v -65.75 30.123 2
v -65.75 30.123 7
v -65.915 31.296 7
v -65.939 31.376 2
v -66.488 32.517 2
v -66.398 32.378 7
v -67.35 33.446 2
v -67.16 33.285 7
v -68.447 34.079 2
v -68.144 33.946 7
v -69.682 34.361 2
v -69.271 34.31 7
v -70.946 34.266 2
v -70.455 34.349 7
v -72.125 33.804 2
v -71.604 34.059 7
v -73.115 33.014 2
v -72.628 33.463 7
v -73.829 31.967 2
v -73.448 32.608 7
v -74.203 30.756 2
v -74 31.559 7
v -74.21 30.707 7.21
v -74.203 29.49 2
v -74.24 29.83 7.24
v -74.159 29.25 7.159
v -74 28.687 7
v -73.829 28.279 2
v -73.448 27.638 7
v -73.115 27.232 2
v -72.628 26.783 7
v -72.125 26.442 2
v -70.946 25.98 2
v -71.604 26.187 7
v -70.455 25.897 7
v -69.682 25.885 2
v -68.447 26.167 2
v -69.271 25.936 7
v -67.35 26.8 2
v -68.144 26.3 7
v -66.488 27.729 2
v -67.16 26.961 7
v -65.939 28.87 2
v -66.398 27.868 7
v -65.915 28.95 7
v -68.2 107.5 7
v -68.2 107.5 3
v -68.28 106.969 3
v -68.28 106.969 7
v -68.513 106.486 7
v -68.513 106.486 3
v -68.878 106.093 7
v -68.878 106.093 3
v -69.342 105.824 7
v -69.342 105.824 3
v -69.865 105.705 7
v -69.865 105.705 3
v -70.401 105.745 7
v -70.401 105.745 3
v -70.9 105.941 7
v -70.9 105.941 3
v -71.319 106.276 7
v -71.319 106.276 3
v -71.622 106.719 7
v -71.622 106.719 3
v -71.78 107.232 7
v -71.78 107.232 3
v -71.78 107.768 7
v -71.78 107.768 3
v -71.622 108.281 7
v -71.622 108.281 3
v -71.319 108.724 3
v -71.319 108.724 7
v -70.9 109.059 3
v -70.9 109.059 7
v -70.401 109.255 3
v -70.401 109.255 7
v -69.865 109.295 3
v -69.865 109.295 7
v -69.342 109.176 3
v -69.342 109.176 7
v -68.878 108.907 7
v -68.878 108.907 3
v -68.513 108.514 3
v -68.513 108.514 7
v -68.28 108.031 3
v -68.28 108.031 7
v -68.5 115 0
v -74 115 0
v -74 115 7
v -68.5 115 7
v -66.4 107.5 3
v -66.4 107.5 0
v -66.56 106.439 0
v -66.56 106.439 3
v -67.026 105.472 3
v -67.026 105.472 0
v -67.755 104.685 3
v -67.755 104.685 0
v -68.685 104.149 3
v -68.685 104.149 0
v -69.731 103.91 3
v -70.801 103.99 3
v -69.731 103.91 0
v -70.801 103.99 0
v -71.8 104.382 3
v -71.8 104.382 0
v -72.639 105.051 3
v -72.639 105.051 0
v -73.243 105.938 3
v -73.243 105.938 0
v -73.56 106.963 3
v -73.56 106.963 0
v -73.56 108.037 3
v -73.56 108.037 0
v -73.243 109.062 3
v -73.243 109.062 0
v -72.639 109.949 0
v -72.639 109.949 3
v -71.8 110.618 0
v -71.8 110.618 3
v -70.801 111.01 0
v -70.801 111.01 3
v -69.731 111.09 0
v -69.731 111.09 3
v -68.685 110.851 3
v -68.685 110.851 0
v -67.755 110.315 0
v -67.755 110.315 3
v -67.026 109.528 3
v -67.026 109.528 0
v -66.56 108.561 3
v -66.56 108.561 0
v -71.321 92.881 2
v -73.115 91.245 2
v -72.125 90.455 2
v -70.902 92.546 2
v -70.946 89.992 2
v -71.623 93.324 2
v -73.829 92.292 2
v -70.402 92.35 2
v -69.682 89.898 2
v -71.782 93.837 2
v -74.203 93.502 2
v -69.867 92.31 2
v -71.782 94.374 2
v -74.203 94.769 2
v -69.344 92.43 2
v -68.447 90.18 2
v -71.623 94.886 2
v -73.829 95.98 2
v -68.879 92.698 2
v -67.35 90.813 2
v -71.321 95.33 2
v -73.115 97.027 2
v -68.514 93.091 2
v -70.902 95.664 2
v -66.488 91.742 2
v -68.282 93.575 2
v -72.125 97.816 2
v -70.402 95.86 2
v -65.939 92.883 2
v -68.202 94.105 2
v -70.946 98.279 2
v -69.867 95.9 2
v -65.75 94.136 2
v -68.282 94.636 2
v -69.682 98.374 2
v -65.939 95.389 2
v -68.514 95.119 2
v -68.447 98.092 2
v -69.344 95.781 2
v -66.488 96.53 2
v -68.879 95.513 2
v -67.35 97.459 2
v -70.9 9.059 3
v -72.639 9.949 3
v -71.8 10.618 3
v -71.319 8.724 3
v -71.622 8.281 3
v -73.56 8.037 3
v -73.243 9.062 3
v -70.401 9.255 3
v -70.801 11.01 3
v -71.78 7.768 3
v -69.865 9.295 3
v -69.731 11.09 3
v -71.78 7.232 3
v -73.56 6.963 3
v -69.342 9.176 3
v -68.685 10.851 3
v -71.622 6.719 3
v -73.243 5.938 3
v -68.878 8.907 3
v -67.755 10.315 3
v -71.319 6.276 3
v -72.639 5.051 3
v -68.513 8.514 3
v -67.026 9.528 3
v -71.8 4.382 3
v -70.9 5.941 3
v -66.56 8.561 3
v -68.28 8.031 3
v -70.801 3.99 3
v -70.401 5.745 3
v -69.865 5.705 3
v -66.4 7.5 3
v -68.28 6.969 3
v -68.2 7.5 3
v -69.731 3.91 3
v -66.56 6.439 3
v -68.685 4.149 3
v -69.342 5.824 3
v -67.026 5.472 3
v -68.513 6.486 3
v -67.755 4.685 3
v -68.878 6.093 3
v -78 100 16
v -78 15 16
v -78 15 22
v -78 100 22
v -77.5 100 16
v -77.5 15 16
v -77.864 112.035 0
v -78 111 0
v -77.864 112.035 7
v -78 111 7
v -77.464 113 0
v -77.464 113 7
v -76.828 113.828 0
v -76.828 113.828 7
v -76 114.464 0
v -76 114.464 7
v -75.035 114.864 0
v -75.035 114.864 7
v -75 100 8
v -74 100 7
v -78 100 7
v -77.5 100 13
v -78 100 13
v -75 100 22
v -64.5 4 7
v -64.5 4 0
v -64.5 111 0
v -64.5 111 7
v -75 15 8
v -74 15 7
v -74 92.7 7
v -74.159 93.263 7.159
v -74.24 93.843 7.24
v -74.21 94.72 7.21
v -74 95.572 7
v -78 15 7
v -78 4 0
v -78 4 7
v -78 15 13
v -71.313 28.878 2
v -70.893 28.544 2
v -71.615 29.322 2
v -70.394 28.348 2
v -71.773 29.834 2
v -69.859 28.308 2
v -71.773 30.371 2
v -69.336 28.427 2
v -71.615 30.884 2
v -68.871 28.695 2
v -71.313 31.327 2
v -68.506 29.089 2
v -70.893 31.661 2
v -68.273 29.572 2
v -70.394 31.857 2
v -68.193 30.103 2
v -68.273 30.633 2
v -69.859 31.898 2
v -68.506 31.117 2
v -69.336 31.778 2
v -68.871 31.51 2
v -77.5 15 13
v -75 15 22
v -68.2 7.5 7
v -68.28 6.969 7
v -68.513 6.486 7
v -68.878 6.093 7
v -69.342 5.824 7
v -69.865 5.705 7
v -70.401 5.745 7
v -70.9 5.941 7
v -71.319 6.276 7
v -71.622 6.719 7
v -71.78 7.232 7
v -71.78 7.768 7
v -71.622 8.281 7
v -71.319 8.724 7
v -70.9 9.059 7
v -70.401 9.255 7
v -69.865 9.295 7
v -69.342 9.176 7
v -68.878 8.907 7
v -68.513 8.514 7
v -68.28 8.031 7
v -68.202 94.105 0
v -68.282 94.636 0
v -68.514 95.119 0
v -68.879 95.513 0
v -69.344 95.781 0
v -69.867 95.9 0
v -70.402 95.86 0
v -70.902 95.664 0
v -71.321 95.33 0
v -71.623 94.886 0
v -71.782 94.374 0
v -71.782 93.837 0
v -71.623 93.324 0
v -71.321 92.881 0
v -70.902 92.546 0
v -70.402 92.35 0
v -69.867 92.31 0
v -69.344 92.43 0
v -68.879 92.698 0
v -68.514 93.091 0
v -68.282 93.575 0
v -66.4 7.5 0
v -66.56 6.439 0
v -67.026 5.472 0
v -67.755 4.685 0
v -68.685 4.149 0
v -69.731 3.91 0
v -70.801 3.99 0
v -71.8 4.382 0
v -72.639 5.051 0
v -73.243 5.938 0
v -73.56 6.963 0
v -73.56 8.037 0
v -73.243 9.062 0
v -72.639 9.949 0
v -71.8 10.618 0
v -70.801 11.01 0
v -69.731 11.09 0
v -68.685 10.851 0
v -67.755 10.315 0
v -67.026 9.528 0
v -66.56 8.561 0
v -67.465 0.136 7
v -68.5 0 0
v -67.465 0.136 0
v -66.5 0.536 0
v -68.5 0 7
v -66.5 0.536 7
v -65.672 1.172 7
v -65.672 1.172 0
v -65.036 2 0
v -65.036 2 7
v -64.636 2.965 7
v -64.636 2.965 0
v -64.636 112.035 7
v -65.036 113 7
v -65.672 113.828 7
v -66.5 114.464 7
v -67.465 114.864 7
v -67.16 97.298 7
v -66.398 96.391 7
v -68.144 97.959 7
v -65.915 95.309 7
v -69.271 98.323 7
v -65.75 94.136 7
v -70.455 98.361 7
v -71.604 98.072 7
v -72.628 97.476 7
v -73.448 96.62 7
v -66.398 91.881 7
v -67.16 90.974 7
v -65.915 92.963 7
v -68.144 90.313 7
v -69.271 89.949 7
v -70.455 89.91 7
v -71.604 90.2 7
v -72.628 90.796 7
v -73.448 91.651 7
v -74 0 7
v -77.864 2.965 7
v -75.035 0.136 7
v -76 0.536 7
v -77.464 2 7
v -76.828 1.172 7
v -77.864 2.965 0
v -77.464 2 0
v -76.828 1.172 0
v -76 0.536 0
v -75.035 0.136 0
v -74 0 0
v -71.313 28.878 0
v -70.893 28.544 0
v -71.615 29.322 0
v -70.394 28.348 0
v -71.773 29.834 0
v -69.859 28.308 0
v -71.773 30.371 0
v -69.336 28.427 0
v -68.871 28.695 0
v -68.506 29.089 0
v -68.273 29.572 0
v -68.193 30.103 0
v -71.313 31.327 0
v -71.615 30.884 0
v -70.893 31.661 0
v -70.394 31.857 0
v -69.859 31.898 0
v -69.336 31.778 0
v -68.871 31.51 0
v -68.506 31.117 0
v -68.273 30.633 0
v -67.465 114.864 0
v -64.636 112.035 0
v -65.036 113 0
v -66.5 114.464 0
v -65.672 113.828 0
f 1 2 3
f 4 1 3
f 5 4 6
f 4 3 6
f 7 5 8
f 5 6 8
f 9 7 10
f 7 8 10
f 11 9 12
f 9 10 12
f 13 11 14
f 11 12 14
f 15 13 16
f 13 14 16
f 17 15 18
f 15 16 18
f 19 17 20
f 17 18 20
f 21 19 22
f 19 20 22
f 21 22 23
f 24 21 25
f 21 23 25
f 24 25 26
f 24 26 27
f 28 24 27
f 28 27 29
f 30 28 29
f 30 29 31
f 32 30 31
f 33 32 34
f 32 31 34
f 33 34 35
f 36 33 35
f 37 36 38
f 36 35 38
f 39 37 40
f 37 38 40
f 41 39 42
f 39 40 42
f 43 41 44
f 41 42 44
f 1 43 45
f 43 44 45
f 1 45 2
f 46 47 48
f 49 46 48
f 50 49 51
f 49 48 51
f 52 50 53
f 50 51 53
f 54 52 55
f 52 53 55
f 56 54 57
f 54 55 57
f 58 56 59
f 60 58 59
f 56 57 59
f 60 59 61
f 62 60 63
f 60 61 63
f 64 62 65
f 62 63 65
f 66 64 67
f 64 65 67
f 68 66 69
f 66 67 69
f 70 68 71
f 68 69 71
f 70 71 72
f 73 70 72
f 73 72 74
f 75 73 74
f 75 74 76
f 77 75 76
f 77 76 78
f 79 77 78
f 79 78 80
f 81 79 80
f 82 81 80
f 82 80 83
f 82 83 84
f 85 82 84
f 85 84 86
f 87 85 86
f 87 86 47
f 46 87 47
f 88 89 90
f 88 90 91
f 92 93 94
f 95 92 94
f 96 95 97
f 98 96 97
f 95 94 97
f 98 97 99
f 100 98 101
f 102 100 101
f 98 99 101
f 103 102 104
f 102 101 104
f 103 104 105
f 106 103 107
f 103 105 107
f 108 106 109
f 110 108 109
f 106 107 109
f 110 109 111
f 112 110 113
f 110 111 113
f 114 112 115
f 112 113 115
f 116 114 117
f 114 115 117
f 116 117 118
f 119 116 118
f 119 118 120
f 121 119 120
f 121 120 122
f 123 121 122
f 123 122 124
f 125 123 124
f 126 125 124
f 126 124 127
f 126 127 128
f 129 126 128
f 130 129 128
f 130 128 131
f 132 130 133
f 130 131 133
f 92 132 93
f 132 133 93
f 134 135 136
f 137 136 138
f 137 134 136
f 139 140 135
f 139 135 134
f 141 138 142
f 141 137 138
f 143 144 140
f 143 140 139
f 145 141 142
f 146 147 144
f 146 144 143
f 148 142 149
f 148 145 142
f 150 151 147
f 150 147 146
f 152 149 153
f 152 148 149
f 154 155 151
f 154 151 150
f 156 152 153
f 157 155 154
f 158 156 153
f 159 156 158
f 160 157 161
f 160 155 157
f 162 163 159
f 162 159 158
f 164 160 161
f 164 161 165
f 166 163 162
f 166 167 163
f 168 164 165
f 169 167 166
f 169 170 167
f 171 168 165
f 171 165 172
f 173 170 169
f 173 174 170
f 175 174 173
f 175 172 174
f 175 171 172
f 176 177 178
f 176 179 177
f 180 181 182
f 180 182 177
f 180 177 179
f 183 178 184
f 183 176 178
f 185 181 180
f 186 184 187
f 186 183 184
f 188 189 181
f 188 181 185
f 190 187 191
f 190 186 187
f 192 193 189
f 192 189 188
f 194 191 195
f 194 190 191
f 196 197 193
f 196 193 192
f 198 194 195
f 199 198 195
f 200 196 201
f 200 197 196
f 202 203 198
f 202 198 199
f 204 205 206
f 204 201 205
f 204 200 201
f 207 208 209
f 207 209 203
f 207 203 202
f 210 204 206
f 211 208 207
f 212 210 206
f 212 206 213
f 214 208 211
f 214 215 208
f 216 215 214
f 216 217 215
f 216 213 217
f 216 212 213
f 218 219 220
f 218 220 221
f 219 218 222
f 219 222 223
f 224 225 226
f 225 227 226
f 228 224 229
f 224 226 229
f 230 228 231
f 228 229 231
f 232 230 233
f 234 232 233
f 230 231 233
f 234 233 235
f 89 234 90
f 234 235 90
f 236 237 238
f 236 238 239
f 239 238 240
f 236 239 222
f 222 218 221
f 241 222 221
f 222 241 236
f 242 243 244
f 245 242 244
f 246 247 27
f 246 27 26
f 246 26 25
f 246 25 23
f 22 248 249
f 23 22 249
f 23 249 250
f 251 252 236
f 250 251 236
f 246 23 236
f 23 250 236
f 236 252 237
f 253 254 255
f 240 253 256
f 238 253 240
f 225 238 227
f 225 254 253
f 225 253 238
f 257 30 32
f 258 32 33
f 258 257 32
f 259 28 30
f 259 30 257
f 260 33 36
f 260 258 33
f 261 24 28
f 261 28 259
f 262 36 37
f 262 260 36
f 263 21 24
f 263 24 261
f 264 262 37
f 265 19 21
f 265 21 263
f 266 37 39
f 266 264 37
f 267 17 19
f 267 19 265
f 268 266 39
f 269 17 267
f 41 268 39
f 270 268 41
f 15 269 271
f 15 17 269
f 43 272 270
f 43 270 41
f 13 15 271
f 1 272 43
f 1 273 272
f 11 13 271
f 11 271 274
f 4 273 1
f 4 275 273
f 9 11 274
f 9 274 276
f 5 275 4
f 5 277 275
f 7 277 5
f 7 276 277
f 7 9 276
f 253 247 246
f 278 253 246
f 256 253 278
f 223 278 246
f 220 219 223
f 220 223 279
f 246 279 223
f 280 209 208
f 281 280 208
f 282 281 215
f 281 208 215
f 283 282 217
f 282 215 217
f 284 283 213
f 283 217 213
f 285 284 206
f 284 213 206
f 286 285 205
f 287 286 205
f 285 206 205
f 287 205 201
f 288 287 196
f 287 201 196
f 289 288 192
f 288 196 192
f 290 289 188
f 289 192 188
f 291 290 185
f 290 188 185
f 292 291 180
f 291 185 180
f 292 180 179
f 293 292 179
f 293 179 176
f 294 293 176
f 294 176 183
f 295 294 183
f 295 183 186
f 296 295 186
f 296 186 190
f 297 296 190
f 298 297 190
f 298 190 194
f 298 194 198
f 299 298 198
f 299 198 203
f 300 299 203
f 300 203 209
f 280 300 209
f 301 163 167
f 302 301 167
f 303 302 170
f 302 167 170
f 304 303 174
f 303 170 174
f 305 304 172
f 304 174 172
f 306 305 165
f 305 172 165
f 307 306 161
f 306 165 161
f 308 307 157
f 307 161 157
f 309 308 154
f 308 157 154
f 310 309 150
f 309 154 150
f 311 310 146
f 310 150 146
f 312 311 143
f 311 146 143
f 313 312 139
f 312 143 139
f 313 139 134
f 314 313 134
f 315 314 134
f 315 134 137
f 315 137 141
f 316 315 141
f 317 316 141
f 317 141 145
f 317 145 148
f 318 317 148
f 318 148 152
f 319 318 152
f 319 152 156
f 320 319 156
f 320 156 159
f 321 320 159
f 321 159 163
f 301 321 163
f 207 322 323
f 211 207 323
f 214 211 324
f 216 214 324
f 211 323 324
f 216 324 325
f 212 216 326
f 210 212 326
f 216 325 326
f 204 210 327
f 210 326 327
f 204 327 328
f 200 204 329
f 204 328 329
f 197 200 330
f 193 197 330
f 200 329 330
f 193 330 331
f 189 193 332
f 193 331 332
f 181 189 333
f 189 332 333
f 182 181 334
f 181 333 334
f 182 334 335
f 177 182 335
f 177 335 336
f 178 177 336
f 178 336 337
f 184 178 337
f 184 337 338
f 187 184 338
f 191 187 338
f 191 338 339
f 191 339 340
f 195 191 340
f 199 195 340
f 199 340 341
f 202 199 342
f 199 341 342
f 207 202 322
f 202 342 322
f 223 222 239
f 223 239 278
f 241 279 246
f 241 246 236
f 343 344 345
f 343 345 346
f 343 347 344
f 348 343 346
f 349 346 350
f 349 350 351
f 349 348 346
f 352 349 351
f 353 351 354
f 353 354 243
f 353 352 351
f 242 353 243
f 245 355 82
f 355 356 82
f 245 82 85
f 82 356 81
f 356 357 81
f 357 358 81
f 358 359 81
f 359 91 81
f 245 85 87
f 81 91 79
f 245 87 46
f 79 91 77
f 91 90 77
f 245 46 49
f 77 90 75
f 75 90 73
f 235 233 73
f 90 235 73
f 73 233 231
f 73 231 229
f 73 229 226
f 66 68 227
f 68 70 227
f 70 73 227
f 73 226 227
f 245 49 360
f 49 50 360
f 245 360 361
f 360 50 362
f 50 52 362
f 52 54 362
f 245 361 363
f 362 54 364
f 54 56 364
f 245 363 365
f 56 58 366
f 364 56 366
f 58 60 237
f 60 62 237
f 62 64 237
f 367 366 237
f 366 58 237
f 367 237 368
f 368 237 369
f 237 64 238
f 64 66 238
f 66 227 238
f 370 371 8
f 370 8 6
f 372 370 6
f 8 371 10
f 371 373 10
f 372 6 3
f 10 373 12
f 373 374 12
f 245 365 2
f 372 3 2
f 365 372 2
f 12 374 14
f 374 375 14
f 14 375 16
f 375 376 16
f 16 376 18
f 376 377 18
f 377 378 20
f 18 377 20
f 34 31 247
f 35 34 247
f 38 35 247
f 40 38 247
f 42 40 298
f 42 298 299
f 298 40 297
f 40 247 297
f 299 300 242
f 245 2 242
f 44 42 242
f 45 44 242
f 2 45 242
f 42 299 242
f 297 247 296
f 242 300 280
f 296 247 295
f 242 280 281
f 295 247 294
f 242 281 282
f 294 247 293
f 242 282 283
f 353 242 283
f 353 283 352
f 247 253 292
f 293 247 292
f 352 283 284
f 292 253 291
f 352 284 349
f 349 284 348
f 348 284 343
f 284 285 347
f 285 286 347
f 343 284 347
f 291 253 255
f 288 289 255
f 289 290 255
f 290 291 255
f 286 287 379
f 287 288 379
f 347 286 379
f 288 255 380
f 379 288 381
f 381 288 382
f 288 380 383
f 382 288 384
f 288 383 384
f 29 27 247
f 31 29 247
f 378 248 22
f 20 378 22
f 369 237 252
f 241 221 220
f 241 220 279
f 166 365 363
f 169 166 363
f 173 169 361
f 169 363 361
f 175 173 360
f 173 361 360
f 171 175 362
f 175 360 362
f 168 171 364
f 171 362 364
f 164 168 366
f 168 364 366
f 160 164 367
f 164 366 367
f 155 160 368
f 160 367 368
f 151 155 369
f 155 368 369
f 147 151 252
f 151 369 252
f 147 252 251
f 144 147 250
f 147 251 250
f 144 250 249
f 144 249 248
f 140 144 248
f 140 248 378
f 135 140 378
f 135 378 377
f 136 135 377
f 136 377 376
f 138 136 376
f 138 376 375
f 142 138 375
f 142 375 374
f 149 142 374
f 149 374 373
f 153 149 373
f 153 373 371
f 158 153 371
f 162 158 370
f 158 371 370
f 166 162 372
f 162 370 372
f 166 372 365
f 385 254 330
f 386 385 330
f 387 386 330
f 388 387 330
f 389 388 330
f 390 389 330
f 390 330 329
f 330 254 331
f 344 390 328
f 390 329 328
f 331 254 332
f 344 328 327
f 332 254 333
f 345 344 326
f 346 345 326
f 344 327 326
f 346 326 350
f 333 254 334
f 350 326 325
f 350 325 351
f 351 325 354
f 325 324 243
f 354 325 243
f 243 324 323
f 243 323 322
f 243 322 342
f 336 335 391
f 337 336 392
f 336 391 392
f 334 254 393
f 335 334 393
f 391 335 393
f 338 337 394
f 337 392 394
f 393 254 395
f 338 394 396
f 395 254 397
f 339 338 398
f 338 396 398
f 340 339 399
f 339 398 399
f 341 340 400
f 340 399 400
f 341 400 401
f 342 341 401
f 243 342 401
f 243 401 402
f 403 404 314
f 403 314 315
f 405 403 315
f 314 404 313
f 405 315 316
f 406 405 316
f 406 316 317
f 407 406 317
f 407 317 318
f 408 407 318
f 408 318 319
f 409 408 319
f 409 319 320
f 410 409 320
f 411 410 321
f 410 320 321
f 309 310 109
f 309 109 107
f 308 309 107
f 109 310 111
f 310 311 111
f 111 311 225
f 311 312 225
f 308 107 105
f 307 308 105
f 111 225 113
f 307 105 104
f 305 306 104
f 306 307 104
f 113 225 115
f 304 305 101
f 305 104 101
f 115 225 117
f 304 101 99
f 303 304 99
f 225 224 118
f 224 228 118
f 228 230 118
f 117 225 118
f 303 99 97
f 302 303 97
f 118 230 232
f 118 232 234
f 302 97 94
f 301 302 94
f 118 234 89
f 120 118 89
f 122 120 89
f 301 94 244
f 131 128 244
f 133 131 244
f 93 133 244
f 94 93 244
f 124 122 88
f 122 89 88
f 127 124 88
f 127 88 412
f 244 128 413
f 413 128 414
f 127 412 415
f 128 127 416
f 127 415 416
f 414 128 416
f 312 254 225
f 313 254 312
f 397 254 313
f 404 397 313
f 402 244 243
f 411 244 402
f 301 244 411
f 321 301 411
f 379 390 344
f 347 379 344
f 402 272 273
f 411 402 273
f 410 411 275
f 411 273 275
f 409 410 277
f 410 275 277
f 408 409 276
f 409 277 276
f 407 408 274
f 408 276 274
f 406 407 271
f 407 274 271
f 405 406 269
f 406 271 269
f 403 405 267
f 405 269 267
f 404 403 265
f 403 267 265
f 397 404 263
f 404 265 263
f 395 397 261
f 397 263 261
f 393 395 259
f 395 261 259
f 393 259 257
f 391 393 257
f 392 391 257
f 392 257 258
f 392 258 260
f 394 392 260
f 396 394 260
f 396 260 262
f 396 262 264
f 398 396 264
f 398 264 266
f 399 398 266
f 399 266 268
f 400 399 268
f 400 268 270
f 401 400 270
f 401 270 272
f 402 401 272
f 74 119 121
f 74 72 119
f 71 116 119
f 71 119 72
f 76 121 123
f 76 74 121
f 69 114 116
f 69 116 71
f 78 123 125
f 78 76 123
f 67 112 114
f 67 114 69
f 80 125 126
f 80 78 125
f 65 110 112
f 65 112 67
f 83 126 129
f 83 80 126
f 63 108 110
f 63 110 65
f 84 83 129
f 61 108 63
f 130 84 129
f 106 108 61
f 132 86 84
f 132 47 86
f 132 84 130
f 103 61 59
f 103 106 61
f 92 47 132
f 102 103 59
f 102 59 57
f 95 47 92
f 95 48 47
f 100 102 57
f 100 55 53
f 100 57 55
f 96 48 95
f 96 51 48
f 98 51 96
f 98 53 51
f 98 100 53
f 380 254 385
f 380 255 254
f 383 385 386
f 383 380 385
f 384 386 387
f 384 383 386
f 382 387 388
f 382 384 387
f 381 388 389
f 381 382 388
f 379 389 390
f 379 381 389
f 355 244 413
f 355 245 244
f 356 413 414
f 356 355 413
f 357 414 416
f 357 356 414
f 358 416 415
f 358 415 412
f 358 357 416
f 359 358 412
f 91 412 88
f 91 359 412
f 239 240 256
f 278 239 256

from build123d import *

# Parameters (mm, degrees)
SKETCH008_W     = 13.5
SKETCH008_H     = 115
PAD001_DEPTH    = 22
SKETCH009_W     = 16
SKETCH009_H     = 16
POCKET007_DEPTH = 30
SKETCH010_R     = 1.8
POCKET008_DEPTH = 22.001
SKETCH011_R     = 3.6
POCKET009_DEPTH = 18
SKETCH012_W     = 11
SKETCH012_H     = 85
POCKET010_DEPTH = 15
CHAMFER001_SIZE = 1
SKETCH013_W     = 87.5
SKETCH013_H     = 3
POCKET011_DEPTH = 0.5
SKETCH014_R     = 1.8
POCKET012_DEPTH = 22.001
SKETCH015_R     = 3.6
POCKET013_DEPTH = 3
FILLET003_R     = 4
SKETCH016_R     = 4.25
POCKET014_DEPTH = 5
SKETCH017_R     = 1.8
POCKET015_DEPTH = 19.001


with BuildPart() as part:
    # Sketch008 → Pad001 (new body)
    with BuildSketch(Plane.XY):
        with Locations((-71.25, 57.5)):
            Rectangle(SKETCH008_W, SKETCH008_H)
    extrude(amount=PAD001_DEPTH)

    # Sketch009 → Pocket007 (cut)
    with BuildSketch(Plane(origin=(-78, 0, 0), x_dir=(0, -1, 0), z_dir=(-1, 0, 0))):
        with Locations((-108, 15)):
            Rectangle(SKETCH009_W, SKETCH009_H)
        with Locations((-7, 15)):
            Rectangle(SKETCH009_W, SKETCH009_H)
    extrude(amount=-POCKET007_DEPTH, mode=Mode.SUBTRACT)

    # Sketch010 → Pocket008 (cut, through all)
    with BuildSketch(Plane.XY.offset(22)):
        with Locations((-70.00164, 94.105309)):
            Circle(SKETCH010_R)
        with Locations((-69.993416, 30.102623)):
            Circle(SKETCH010_R)
    extrude(amount=-POCKET008_DEPTH, mode=Mode.SUBTRACT)

    # Sketch011 → Pocket009 (cut)
    with BuildSketch(Plane.XY.offset(22)):
        with Locations((-70, 94.117142)):
            Circle(SKETCH011_R)
        with Locations((-70, 30.122299)):
            Circle(SKETCH011_R)
    extrude(amount=-POCKET009_DEPTH, mode=Mode.SUBTRACT)

    # Sketch012 → Pocket010 (cut)
    with BuildSketch(Plane.XY.offset(22)):
        with Locations((-69.5, 57.5)):
            Rectangle(SKETCH012_W, SKETCH012_H)
    extrude(amount=-POCKET010_DEPTH, mode=Mode.SUBTRACT)

    # Chamfer001
    chamfer001_edges = [part.edges().sort_by_distance(p)[0] for p in [
        (-75, 57.5, 7),
    ]]
    chamfer(chamfer001_edges, length=CHAMFER001_SIZE)

    # Sketch013 → Pocket011 (cut)
    with BuildSketch(Plane(origin=(-78, 0, 0), x_dir=(0, -1, 0), z_dir=(-1, 0, 0))):
        with Locations((-57.75, 14.5)):
            Rectangle(SKETCH013_W, SKETCH013_H)
    extrude(amount=-POCKET011_DEPTH, mode=Mode.SUBTRACT)

    # Sketch014 → Pocket012 (cut, through all)
    with BuildSketch(Plane(origin=(0, 0, 0), x_dir=(1, 0, 0), z_dir=(0, 0, -1))):
        with Locations((-70, -7.5)):
            Circle(SKETCH014_R)
        with Locations((-70, -107.5)):
            Circle(SKETCH014_R)
    extrude(amount=-POCKET012_DEPTH, mode=Mode.SUBTRACT)

    # Sketch015 → Pocket013 (cut)
    with BuildSketch(Plane(origin=(0, 0, 0), x_dir=(1, 0, 0), z_dir=(0, 0, -1))):
        with Locations((-70, -7.5)):
            Circle(SKETCH015_R)
        with Locations((-70, -107.5)):
            Circle(SKETCH015_R)
    extrude(amount=-POCKET013_DEPTH, mode=Mode.SUBTRACT)

    # Fillet003
    fillet003_edges = [part.edges().sort_by_distance(p)[0] for p in [
        (-78, 0, 3.5),
        (-64.5, 0, 3.5),
        (-64.5, 115, 3.5),
        (-78, 115, 3.5),
    ]]
    fillet(fillet003_edges, radius=FILLET003_R)

    # Sketch016 → Pocket014 (cut, symmetric)
    with BuildSketch(Plane.XY.offset(7)):
        with Locations((-70, 94.135872)):
            Circle(SKETCH016_R)
        with Locations((-70, 30.123001)):
            Circle(SKETCH016_R)
    extrude(amount=POCKET014_DEPTH, both=True, mode=Mode.SUBTRACT)

    # Sketch017 → Pocket015 (cut, through all)
    with BuildSketch(Plane(origin=(0, 0, 3), x_dir=(1, 0, 0), z_dir=(0, 0, -1))):
        with Locations((-70, 30.106855)):
            Circle(SKETCH017_R)
        with Locations((-70, 94.115112)):
            Circle(SKETCH017_R)
    extrude(amount=-POCKET015_DEPTH, mode=Mode.SUBTRACT)


solid = part.part
